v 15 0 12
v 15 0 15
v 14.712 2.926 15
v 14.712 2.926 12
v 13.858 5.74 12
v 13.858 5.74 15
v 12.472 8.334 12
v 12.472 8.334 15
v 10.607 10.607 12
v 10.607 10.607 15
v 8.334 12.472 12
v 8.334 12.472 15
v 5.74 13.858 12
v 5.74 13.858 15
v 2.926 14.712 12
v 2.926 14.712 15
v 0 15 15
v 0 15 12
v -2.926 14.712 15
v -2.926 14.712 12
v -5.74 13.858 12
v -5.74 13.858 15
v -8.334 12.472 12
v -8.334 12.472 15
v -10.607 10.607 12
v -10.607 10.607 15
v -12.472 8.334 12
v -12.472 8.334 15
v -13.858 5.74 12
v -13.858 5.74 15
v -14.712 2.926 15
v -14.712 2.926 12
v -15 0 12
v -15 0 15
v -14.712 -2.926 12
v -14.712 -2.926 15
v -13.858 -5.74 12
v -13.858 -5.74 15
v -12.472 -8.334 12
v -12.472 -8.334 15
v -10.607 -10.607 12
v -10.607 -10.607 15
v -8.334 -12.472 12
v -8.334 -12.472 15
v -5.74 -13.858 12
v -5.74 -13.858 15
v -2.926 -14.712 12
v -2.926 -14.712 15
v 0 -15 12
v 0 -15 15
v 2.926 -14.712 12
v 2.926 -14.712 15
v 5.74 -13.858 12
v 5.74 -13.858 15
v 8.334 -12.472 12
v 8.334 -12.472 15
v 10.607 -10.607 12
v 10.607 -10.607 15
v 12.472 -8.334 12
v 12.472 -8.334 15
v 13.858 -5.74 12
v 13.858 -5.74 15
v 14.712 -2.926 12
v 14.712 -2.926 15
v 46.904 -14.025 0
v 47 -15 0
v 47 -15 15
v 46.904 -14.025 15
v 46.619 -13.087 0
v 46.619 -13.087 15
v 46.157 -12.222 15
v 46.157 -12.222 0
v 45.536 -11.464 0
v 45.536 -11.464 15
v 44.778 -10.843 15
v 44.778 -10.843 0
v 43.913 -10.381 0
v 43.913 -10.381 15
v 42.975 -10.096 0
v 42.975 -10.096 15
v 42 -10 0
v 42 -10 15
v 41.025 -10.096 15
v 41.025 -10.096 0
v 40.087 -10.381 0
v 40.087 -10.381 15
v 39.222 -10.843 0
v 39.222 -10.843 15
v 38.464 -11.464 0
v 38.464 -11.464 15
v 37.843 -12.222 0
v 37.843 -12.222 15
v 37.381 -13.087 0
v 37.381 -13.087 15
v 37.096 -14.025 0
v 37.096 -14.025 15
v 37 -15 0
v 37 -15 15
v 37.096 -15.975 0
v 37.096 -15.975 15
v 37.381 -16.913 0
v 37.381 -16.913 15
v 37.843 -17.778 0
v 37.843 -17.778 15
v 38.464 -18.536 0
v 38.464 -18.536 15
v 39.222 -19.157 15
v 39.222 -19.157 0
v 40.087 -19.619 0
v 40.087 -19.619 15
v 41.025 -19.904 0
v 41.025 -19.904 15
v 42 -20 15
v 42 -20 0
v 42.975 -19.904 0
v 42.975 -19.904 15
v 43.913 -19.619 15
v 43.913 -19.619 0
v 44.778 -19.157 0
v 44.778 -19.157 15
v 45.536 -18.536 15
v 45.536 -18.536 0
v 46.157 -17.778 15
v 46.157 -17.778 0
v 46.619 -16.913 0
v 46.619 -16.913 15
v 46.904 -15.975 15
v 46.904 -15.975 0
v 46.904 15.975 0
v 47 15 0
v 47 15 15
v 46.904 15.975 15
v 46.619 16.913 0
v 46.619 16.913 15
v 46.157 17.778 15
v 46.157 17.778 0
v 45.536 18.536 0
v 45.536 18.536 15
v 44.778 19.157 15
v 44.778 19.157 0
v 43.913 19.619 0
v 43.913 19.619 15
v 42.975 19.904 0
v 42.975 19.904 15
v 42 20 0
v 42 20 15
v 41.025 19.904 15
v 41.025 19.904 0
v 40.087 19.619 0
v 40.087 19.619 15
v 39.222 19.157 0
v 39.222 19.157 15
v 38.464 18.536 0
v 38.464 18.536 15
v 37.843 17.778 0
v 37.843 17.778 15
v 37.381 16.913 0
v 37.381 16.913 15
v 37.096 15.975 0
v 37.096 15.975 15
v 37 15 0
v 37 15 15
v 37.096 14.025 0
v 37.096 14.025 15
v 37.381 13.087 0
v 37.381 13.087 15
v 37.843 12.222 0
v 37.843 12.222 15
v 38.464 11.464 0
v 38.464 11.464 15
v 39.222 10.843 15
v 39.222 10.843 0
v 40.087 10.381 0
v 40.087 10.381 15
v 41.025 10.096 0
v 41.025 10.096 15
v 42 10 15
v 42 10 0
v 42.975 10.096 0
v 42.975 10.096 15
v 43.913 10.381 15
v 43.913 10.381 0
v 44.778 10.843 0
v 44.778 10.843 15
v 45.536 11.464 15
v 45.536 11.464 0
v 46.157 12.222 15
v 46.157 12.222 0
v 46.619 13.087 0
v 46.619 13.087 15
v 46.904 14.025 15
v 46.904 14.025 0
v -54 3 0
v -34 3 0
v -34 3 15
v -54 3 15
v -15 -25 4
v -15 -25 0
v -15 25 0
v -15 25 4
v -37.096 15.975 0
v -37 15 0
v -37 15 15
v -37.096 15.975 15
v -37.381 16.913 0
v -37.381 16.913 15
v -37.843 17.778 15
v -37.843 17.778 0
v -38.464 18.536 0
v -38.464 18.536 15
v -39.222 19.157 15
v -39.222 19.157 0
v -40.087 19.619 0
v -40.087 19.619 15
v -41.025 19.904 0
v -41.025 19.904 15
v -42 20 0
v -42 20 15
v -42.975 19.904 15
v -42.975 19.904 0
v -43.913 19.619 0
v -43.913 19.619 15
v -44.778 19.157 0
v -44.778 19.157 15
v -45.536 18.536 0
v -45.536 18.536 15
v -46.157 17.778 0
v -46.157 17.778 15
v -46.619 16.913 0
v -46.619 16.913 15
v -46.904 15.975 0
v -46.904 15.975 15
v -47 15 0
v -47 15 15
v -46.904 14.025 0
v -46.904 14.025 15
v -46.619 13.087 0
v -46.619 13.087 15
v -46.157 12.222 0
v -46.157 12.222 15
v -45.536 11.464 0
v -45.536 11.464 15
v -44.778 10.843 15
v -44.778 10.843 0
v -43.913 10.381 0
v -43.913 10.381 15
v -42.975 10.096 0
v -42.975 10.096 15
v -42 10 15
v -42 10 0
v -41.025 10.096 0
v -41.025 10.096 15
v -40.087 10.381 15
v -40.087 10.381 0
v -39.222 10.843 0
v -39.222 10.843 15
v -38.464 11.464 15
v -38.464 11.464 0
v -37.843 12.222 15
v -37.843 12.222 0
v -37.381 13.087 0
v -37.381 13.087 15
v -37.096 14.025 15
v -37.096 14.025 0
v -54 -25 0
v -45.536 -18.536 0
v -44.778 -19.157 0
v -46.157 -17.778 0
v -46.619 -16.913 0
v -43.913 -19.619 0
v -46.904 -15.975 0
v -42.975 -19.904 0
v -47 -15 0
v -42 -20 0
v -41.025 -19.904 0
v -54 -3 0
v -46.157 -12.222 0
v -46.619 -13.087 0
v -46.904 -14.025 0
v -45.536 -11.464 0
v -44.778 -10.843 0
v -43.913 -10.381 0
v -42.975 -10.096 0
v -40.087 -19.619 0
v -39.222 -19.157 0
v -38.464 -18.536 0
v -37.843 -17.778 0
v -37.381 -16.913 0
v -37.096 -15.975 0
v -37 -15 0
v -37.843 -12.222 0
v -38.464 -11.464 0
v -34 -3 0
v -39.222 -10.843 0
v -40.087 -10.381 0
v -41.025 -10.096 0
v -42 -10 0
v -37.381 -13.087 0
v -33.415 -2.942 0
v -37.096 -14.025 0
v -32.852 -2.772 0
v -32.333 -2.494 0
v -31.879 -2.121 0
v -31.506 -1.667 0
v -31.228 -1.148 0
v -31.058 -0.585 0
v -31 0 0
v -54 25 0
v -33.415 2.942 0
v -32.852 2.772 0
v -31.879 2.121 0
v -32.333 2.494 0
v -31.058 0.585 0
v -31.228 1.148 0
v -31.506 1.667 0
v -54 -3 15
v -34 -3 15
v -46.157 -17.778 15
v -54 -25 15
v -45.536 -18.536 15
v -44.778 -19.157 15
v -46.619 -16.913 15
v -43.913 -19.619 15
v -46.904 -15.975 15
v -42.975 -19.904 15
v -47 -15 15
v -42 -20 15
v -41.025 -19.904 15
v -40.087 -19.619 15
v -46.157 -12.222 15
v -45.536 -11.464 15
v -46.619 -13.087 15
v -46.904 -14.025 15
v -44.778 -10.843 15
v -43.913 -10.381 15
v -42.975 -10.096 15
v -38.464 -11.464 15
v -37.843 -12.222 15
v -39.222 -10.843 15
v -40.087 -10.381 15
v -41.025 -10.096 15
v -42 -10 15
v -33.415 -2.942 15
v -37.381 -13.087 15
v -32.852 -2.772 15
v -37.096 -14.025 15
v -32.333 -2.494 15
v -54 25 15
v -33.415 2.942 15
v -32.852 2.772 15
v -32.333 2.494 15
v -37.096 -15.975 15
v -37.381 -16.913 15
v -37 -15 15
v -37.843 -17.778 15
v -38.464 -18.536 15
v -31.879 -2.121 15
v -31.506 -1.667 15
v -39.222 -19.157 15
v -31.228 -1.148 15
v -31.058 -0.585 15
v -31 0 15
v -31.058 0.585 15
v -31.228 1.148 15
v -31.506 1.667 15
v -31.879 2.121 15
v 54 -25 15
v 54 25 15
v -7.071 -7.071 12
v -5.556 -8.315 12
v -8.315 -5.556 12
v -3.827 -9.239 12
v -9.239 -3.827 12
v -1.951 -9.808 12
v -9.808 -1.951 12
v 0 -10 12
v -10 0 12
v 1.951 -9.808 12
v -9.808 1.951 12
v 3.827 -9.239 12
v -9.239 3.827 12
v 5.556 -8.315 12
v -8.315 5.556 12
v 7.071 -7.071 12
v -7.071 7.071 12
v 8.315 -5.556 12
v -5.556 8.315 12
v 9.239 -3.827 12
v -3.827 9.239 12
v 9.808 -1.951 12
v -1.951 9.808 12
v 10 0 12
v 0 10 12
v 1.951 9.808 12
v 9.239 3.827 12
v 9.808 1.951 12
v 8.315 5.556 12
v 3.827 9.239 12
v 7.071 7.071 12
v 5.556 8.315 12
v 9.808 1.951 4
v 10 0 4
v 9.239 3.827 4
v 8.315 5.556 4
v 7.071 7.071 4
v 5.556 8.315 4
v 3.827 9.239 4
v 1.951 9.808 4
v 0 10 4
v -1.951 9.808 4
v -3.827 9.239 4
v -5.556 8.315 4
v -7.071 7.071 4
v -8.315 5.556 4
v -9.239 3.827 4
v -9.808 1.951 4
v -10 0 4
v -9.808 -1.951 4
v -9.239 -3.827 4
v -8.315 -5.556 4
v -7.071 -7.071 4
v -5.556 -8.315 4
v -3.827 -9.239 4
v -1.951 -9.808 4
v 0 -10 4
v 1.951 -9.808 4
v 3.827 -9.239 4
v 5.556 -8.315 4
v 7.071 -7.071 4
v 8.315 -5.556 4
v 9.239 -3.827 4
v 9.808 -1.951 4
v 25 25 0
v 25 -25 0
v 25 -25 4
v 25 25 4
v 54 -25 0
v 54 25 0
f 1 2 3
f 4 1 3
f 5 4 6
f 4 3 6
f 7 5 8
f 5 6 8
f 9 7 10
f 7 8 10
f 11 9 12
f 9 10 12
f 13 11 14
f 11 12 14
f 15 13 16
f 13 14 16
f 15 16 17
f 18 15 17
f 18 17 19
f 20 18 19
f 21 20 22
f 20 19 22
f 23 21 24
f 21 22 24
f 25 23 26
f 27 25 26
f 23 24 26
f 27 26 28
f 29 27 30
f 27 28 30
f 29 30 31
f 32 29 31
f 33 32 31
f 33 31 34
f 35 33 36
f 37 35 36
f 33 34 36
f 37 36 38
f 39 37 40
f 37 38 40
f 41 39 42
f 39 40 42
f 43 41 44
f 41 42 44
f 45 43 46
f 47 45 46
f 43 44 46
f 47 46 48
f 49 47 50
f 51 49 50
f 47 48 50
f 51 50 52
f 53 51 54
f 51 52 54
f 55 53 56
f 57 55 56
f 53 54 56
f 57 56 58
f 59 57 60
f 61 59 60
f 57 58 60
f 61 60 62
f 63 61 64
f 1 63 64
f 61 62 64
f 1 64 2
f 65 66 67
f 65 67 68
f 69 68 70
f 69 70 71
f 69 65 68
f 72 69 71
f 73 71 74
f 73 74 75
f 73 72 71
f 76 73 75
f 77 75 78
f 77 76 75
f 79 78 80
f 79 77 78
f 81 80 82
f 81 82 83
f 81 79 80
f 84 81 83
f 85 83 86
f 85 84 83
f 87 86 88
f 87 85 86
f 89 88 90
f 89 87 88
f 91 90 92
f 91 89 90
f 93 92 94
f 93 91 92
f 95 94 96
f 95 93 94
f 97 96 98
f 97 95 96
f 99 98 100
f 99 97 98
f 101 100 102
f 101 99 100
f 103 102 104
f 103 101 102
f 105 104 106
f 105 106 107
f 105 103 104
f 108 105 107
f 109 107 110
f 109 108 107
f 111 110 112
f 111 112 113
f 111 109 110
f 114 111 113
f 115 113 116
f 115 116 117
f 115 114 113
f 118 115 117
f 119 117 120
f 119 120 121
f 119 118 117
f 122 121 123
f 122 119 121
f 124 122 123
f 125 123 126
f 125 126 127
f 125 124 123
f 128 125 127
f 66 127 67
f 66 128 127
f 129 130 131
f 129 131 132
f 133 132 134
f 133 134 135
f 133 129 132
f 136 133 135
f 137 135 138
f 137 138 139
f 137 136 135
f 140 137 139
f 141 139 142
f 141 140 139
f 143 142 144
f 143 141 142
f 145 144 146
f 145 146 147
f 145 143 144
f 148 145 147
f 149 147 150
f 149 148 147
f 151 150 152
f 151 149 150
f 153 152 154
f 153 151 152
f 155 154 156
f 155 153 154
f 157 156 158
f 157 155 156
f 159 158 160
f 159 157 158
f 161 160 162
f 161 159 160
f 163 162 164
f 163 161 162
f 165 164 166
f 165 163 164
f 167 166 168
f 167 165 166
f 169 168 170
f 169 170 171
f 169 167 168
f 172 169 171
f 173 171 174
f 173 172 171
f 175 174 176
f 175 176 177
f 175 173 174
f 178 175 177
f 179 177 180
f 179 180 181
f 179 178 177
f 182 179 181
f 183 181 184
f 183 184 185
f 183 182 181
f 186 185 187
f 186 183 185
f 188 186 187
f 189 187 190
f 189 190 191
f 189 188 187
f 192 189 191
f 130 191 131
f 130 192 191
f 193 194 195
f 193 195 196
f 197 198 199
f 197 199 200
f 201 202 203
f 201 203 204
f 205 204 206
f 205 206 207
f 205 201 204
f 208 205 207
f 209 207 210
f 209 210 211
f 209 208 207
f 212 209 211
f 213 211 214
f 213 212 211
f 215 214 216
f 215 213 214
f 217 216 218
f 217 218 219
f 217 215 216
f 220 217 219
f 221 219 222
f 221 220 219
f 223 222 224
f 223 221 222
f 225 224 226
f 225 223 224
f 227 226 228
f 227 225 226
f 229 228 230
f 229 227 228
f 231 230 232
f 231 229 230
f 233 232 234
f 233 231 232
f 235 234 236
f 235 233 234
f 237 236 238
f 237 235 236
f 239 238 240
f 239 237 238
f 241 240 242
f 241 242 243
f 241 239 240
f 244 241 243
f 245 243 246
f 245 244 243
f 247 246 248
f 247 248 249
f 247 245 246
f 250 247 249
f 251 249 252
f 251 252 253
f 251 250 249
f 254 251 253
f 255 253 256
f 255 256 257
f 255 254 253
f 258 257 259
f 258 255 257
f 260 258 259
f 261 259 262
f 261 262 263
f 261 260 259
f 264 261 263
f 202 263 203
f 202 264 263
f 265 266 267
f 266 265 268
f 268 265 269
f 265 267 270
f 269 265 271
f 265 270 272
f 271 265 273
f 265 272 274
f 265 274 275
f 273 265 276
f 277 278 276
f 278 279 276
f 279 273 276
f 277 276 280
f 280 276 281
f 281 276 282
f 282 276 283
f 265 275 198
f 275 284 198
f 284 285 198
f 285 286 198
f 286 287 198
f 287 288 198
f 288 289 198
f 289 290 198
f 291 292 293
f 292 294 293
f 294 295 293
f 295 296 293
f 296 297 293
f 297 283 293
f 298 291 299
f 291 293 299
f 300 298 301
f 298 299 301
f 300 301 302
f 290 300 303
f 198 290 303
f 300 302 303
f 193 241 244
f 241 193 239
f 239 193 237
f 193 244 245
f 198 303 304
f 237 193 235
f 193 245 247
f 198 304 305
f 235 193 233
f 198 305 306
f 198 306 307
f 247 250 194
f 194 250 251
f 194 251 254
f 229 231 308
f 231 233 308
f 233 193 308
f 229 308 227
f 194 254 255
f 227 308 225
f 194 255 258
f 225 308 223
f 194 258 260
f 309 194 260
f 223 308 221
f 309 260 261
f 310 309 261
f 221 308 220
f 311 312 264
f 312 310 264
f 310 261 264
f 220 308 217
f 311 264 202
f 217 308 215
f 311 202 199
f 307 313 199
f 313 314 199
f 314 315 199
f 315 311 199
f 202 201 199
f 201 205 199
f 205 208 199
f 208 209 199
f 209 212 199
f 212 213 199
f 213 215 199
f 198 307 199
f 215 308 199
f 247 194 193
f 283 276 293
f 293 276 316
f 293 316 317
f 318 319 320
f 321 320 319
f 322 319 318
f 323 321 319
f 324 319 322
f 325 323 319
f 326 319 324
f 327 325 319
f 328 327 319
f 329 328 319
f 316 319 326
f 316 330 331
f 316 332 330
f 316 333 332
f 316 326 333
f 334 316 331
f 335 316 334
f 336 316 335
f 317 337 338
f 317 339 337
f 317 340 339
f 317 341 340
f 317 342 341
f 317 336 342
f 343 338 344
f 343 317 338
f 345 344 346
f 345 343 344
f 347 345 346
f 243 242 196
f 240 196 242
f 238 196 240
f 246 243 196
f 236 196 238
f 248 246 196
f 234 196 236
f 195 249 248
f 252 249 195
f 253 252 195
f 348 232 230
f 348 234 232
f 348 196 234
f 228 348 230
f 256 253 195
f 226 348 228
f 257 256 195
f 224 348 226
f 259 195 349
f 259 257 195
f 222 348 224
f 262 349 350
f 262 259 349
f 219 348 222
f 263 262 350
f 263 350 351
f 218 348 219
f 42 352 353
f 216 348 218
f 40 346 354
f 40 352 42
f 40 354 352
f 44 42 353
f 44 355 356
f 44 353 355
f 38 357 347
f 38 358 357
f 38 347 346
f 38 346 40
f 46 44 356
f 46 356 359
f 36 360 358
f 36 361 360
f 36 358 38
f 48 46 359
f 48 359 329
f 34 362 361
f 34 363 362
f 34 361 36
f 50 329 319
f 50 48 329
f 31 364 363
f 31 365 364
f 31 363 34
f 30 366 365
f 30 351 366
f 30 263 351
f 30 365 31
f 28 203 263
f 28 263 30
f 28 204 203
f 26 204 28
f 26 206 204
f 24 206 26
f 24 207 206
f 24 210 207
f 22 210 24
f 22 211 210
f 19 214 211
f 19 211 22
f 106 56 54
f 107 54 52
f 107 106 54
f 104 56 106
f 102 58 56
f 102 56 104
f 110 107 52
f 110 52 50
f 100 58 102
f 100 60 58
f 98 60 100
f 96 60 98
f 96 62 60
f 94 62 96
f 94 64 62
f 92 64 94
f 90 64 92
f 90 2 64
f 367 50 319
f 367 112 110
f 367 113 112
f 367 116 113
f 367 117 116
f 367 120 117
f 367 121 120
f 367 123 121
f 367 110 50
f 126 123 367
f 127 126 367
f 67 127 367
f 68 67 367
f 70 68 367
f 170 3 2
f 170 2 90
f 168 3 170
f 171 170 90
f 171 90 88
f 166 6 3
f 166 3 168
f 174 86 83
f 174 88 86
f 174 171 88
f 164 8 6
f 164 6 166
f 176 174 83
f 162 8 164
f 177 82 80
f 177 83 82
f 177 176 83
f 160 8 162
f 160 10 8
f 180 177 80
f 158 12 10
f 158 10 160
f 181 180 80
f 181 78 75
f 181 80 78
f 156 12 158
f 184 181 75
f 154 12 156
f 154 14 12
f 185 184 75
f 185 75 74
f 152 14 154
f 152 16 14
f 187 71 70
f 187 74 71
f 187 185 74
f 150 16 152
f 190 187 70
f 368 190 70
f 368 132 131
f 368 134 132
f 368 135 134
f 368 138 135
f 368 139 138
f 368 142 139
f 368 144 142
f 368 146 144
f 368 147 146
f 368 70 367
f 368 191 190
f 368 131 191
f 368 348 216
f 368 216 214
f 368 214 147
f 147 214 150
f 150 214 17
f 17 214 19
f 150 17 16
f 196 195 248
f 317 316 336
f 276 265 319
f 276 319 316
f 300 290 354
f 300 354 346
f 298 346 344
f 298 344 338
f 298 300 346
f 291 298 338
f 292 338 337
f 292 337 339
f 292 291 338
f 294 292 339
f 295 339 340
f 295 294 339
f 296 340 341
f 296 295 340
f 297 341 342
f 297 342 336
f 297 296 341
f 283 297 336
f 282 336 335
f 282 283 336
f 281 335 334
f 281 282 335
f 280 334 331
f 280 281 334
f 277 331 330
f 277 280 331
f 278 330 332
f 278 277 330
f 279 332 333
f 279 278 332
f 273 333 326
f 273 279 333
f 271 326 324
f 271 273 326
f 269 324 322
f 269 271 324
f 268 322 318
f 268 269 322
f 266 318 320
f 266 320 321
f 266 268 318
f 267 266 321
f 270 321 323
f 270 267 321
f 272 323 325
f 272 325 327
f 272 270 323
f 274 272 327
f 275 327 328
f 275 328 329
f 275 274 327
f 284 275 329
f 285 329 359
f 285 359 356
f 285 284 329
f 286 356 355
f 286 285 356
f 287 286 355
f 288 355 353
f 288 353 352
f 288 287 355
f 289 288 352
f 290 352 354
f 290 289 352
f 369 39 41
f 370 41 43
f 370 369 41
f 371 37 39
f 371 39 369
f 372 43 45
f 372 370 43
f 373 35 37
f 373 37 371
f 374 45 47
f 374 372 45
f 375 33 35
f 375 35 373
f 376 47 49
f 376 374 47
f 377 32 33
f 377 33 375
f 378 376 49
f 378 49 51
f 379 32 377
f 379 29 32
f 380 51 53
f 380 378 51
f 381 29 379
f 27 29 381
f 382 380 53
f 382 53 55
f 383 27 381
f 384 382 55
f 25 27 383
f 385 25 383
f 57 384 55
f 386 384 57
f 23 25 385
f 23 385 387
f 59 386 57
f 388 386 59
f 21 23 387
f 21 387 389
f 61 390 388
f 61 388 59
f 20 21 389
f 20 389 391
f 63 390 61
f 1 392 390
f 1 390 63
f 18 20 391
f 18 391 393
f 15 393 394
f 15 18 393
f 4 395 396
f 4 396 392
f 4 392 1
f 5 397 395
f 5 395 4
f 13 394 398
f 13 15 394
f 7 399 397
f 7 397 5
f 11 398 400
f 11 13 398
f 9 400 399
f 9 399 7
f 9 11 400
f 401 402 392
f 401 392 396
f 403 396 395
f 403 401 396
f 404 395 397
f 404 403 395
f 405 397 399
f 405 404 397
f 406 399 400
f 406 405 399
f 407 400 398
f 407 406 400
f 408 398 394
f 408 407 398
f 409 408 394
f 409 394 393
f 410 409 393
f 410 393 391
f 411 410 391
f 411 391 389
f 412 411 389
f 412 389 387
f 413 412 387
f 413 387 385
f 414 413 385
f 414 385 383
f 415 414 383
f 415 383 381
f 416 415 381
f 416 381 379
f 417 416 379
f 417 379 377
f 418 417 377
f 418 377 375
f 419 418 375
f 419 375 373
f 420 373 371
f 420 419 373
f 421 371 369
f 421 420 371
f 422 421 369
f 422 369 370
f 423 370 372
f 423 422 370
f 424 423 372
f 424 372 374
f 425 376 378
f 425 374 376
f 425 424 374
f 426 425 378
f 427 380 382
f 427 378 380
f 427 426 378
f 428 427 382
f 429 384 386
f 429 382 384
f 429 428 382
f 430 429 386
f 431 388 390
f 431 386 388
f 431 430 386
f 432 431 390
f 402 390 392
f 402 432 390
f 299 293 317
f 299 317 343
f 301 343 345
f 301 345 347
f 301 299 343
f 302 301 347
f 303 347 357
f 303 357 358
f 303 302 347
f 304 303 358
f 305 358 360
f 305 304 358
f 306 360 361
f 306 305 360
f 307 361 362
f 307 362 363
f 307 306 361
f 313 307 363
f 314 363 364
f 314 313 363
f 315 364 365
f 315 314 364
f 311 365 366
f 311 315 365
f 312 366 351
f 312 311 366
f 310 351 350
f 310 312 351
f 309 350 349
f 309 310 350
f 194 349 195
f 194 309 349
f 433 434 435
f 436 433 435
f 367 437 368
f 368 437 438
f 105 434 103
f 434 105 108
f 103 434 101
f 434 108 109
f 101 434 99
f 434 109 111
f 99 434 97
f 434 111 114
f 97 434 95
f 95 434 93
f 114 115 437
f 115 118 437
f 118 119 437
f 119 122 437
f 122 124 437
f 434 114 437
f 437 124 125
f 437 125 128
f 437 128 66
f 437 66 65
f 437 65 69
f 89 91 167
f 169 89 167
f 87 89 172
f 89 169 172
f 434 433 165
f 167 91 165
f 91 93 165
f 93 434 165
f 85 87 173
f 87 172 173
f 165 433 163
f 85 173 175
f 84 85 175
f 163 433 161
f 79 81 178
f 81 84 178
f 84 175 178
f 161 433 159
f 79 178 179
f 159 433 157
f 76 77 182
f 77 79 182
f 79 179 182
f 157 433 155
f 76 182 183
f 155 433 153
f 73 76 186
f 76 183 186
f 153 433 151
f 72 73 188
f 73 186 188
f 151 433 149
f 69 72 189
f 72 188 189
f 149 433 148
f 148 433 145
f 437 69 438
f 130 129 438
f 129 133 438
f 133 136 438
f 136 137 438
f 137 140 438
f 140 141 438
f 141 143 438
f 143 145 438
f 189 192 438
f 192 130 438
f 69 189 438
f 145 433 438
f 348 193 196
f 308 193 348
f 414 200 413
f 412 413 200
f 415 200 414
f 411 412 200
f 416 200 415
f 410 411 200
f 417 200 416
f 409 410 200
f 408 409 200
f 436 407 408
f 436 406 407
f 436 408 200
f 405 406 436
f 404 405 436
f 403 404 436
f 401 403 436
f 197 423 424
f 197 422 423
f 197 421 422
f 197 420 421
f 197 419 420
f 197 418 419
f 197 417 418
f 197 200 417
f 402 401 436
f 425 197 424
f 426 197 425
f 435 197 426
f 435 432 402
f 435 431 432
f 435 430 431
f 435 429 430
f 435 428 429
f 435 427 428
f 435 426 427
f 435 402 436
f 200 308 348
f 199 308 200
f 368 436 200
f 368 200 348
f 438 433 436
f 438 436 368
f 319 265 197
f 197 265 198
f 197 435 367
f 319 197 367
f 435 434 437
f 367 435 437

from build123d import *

# Parameters (mm, degrees)
ESBO_O1_W                = 108
ESBO_O1_H                = 50
RESSALTO_EXTRUS_O1_DEPTH = 15
ESBO_O2_R                = 10
ESBO_O2_R_2              = 5
CORTE_EXTRUS_O2_DEPTH    = 15
ESBO_O4_R                = 15
CORTE_EXTRUS_O5_DEPTH    = 3
ESBO_O5_W                = 40
ESBO_O5_H                = 4
CORTE_EXTRUS_O6_DEPTH    = 76.106590923


with BuildPart() as part:
    # Esboço1 → Ressalto-extrusão1 (new body)
    with BuildSketch(Plane.XY):
        Rectangle(ESBO_O1_W, ESBO_O1_H)
    extrude(amount=RESSALTO_EXTRUS_O1_DEPTH)

    # Esboço2 → Corte-extrusão2 (cut)
    with BuildSketch(Plane.XY):
        Circle(ESBO_O2_R)
        with Locations((42, 15)):
            Circle(ESBO_O2_R_2)
        with Locations((-42, 15)):
            Circle(ESBO_O2_R_2)
        with Locations((42, -15)):
            Circle(ESBO_O2_R_2)
        with Locations((-42, -15)):
            Circle(ESBO_O2_R_2)
        with BuildLine():
            Line((-34, 3), (-54, 3))
            Line((-54, 3), (-54, -3))
            Line((-54, -3), (-34, -3))
            ThreePointArc((-34, -3), (-31, 0), (-34, 3))
        make_face()
    extrude(amount=CORTE_EXTRUS_O2_DEPTH, mode=Mode.SUBTRACT)

    # Esboço4 → Corte-extrusão5 (cut)
    with BuildSketch(Plane.XY.offset(15)):
        Circle(ESBO_O4_R)
    extrude(amount=-CORTE_EXTRUS_O5_DEPTH, mode=Mode.SUBTRACT)

    # Esboço5 → Corte-extrusão6 (cut, through all)
    with BuildSketch(Plane.XZ.offset(25)):
        with Locations((5, 2)):
            Rectangle(ESBO_O5_W, ESBO_O5_H)
    extrude(amount=-CORTE_EXTRUS_O6_DEPTH, mode=Mode.SUBTRACT)


solid = part.part
